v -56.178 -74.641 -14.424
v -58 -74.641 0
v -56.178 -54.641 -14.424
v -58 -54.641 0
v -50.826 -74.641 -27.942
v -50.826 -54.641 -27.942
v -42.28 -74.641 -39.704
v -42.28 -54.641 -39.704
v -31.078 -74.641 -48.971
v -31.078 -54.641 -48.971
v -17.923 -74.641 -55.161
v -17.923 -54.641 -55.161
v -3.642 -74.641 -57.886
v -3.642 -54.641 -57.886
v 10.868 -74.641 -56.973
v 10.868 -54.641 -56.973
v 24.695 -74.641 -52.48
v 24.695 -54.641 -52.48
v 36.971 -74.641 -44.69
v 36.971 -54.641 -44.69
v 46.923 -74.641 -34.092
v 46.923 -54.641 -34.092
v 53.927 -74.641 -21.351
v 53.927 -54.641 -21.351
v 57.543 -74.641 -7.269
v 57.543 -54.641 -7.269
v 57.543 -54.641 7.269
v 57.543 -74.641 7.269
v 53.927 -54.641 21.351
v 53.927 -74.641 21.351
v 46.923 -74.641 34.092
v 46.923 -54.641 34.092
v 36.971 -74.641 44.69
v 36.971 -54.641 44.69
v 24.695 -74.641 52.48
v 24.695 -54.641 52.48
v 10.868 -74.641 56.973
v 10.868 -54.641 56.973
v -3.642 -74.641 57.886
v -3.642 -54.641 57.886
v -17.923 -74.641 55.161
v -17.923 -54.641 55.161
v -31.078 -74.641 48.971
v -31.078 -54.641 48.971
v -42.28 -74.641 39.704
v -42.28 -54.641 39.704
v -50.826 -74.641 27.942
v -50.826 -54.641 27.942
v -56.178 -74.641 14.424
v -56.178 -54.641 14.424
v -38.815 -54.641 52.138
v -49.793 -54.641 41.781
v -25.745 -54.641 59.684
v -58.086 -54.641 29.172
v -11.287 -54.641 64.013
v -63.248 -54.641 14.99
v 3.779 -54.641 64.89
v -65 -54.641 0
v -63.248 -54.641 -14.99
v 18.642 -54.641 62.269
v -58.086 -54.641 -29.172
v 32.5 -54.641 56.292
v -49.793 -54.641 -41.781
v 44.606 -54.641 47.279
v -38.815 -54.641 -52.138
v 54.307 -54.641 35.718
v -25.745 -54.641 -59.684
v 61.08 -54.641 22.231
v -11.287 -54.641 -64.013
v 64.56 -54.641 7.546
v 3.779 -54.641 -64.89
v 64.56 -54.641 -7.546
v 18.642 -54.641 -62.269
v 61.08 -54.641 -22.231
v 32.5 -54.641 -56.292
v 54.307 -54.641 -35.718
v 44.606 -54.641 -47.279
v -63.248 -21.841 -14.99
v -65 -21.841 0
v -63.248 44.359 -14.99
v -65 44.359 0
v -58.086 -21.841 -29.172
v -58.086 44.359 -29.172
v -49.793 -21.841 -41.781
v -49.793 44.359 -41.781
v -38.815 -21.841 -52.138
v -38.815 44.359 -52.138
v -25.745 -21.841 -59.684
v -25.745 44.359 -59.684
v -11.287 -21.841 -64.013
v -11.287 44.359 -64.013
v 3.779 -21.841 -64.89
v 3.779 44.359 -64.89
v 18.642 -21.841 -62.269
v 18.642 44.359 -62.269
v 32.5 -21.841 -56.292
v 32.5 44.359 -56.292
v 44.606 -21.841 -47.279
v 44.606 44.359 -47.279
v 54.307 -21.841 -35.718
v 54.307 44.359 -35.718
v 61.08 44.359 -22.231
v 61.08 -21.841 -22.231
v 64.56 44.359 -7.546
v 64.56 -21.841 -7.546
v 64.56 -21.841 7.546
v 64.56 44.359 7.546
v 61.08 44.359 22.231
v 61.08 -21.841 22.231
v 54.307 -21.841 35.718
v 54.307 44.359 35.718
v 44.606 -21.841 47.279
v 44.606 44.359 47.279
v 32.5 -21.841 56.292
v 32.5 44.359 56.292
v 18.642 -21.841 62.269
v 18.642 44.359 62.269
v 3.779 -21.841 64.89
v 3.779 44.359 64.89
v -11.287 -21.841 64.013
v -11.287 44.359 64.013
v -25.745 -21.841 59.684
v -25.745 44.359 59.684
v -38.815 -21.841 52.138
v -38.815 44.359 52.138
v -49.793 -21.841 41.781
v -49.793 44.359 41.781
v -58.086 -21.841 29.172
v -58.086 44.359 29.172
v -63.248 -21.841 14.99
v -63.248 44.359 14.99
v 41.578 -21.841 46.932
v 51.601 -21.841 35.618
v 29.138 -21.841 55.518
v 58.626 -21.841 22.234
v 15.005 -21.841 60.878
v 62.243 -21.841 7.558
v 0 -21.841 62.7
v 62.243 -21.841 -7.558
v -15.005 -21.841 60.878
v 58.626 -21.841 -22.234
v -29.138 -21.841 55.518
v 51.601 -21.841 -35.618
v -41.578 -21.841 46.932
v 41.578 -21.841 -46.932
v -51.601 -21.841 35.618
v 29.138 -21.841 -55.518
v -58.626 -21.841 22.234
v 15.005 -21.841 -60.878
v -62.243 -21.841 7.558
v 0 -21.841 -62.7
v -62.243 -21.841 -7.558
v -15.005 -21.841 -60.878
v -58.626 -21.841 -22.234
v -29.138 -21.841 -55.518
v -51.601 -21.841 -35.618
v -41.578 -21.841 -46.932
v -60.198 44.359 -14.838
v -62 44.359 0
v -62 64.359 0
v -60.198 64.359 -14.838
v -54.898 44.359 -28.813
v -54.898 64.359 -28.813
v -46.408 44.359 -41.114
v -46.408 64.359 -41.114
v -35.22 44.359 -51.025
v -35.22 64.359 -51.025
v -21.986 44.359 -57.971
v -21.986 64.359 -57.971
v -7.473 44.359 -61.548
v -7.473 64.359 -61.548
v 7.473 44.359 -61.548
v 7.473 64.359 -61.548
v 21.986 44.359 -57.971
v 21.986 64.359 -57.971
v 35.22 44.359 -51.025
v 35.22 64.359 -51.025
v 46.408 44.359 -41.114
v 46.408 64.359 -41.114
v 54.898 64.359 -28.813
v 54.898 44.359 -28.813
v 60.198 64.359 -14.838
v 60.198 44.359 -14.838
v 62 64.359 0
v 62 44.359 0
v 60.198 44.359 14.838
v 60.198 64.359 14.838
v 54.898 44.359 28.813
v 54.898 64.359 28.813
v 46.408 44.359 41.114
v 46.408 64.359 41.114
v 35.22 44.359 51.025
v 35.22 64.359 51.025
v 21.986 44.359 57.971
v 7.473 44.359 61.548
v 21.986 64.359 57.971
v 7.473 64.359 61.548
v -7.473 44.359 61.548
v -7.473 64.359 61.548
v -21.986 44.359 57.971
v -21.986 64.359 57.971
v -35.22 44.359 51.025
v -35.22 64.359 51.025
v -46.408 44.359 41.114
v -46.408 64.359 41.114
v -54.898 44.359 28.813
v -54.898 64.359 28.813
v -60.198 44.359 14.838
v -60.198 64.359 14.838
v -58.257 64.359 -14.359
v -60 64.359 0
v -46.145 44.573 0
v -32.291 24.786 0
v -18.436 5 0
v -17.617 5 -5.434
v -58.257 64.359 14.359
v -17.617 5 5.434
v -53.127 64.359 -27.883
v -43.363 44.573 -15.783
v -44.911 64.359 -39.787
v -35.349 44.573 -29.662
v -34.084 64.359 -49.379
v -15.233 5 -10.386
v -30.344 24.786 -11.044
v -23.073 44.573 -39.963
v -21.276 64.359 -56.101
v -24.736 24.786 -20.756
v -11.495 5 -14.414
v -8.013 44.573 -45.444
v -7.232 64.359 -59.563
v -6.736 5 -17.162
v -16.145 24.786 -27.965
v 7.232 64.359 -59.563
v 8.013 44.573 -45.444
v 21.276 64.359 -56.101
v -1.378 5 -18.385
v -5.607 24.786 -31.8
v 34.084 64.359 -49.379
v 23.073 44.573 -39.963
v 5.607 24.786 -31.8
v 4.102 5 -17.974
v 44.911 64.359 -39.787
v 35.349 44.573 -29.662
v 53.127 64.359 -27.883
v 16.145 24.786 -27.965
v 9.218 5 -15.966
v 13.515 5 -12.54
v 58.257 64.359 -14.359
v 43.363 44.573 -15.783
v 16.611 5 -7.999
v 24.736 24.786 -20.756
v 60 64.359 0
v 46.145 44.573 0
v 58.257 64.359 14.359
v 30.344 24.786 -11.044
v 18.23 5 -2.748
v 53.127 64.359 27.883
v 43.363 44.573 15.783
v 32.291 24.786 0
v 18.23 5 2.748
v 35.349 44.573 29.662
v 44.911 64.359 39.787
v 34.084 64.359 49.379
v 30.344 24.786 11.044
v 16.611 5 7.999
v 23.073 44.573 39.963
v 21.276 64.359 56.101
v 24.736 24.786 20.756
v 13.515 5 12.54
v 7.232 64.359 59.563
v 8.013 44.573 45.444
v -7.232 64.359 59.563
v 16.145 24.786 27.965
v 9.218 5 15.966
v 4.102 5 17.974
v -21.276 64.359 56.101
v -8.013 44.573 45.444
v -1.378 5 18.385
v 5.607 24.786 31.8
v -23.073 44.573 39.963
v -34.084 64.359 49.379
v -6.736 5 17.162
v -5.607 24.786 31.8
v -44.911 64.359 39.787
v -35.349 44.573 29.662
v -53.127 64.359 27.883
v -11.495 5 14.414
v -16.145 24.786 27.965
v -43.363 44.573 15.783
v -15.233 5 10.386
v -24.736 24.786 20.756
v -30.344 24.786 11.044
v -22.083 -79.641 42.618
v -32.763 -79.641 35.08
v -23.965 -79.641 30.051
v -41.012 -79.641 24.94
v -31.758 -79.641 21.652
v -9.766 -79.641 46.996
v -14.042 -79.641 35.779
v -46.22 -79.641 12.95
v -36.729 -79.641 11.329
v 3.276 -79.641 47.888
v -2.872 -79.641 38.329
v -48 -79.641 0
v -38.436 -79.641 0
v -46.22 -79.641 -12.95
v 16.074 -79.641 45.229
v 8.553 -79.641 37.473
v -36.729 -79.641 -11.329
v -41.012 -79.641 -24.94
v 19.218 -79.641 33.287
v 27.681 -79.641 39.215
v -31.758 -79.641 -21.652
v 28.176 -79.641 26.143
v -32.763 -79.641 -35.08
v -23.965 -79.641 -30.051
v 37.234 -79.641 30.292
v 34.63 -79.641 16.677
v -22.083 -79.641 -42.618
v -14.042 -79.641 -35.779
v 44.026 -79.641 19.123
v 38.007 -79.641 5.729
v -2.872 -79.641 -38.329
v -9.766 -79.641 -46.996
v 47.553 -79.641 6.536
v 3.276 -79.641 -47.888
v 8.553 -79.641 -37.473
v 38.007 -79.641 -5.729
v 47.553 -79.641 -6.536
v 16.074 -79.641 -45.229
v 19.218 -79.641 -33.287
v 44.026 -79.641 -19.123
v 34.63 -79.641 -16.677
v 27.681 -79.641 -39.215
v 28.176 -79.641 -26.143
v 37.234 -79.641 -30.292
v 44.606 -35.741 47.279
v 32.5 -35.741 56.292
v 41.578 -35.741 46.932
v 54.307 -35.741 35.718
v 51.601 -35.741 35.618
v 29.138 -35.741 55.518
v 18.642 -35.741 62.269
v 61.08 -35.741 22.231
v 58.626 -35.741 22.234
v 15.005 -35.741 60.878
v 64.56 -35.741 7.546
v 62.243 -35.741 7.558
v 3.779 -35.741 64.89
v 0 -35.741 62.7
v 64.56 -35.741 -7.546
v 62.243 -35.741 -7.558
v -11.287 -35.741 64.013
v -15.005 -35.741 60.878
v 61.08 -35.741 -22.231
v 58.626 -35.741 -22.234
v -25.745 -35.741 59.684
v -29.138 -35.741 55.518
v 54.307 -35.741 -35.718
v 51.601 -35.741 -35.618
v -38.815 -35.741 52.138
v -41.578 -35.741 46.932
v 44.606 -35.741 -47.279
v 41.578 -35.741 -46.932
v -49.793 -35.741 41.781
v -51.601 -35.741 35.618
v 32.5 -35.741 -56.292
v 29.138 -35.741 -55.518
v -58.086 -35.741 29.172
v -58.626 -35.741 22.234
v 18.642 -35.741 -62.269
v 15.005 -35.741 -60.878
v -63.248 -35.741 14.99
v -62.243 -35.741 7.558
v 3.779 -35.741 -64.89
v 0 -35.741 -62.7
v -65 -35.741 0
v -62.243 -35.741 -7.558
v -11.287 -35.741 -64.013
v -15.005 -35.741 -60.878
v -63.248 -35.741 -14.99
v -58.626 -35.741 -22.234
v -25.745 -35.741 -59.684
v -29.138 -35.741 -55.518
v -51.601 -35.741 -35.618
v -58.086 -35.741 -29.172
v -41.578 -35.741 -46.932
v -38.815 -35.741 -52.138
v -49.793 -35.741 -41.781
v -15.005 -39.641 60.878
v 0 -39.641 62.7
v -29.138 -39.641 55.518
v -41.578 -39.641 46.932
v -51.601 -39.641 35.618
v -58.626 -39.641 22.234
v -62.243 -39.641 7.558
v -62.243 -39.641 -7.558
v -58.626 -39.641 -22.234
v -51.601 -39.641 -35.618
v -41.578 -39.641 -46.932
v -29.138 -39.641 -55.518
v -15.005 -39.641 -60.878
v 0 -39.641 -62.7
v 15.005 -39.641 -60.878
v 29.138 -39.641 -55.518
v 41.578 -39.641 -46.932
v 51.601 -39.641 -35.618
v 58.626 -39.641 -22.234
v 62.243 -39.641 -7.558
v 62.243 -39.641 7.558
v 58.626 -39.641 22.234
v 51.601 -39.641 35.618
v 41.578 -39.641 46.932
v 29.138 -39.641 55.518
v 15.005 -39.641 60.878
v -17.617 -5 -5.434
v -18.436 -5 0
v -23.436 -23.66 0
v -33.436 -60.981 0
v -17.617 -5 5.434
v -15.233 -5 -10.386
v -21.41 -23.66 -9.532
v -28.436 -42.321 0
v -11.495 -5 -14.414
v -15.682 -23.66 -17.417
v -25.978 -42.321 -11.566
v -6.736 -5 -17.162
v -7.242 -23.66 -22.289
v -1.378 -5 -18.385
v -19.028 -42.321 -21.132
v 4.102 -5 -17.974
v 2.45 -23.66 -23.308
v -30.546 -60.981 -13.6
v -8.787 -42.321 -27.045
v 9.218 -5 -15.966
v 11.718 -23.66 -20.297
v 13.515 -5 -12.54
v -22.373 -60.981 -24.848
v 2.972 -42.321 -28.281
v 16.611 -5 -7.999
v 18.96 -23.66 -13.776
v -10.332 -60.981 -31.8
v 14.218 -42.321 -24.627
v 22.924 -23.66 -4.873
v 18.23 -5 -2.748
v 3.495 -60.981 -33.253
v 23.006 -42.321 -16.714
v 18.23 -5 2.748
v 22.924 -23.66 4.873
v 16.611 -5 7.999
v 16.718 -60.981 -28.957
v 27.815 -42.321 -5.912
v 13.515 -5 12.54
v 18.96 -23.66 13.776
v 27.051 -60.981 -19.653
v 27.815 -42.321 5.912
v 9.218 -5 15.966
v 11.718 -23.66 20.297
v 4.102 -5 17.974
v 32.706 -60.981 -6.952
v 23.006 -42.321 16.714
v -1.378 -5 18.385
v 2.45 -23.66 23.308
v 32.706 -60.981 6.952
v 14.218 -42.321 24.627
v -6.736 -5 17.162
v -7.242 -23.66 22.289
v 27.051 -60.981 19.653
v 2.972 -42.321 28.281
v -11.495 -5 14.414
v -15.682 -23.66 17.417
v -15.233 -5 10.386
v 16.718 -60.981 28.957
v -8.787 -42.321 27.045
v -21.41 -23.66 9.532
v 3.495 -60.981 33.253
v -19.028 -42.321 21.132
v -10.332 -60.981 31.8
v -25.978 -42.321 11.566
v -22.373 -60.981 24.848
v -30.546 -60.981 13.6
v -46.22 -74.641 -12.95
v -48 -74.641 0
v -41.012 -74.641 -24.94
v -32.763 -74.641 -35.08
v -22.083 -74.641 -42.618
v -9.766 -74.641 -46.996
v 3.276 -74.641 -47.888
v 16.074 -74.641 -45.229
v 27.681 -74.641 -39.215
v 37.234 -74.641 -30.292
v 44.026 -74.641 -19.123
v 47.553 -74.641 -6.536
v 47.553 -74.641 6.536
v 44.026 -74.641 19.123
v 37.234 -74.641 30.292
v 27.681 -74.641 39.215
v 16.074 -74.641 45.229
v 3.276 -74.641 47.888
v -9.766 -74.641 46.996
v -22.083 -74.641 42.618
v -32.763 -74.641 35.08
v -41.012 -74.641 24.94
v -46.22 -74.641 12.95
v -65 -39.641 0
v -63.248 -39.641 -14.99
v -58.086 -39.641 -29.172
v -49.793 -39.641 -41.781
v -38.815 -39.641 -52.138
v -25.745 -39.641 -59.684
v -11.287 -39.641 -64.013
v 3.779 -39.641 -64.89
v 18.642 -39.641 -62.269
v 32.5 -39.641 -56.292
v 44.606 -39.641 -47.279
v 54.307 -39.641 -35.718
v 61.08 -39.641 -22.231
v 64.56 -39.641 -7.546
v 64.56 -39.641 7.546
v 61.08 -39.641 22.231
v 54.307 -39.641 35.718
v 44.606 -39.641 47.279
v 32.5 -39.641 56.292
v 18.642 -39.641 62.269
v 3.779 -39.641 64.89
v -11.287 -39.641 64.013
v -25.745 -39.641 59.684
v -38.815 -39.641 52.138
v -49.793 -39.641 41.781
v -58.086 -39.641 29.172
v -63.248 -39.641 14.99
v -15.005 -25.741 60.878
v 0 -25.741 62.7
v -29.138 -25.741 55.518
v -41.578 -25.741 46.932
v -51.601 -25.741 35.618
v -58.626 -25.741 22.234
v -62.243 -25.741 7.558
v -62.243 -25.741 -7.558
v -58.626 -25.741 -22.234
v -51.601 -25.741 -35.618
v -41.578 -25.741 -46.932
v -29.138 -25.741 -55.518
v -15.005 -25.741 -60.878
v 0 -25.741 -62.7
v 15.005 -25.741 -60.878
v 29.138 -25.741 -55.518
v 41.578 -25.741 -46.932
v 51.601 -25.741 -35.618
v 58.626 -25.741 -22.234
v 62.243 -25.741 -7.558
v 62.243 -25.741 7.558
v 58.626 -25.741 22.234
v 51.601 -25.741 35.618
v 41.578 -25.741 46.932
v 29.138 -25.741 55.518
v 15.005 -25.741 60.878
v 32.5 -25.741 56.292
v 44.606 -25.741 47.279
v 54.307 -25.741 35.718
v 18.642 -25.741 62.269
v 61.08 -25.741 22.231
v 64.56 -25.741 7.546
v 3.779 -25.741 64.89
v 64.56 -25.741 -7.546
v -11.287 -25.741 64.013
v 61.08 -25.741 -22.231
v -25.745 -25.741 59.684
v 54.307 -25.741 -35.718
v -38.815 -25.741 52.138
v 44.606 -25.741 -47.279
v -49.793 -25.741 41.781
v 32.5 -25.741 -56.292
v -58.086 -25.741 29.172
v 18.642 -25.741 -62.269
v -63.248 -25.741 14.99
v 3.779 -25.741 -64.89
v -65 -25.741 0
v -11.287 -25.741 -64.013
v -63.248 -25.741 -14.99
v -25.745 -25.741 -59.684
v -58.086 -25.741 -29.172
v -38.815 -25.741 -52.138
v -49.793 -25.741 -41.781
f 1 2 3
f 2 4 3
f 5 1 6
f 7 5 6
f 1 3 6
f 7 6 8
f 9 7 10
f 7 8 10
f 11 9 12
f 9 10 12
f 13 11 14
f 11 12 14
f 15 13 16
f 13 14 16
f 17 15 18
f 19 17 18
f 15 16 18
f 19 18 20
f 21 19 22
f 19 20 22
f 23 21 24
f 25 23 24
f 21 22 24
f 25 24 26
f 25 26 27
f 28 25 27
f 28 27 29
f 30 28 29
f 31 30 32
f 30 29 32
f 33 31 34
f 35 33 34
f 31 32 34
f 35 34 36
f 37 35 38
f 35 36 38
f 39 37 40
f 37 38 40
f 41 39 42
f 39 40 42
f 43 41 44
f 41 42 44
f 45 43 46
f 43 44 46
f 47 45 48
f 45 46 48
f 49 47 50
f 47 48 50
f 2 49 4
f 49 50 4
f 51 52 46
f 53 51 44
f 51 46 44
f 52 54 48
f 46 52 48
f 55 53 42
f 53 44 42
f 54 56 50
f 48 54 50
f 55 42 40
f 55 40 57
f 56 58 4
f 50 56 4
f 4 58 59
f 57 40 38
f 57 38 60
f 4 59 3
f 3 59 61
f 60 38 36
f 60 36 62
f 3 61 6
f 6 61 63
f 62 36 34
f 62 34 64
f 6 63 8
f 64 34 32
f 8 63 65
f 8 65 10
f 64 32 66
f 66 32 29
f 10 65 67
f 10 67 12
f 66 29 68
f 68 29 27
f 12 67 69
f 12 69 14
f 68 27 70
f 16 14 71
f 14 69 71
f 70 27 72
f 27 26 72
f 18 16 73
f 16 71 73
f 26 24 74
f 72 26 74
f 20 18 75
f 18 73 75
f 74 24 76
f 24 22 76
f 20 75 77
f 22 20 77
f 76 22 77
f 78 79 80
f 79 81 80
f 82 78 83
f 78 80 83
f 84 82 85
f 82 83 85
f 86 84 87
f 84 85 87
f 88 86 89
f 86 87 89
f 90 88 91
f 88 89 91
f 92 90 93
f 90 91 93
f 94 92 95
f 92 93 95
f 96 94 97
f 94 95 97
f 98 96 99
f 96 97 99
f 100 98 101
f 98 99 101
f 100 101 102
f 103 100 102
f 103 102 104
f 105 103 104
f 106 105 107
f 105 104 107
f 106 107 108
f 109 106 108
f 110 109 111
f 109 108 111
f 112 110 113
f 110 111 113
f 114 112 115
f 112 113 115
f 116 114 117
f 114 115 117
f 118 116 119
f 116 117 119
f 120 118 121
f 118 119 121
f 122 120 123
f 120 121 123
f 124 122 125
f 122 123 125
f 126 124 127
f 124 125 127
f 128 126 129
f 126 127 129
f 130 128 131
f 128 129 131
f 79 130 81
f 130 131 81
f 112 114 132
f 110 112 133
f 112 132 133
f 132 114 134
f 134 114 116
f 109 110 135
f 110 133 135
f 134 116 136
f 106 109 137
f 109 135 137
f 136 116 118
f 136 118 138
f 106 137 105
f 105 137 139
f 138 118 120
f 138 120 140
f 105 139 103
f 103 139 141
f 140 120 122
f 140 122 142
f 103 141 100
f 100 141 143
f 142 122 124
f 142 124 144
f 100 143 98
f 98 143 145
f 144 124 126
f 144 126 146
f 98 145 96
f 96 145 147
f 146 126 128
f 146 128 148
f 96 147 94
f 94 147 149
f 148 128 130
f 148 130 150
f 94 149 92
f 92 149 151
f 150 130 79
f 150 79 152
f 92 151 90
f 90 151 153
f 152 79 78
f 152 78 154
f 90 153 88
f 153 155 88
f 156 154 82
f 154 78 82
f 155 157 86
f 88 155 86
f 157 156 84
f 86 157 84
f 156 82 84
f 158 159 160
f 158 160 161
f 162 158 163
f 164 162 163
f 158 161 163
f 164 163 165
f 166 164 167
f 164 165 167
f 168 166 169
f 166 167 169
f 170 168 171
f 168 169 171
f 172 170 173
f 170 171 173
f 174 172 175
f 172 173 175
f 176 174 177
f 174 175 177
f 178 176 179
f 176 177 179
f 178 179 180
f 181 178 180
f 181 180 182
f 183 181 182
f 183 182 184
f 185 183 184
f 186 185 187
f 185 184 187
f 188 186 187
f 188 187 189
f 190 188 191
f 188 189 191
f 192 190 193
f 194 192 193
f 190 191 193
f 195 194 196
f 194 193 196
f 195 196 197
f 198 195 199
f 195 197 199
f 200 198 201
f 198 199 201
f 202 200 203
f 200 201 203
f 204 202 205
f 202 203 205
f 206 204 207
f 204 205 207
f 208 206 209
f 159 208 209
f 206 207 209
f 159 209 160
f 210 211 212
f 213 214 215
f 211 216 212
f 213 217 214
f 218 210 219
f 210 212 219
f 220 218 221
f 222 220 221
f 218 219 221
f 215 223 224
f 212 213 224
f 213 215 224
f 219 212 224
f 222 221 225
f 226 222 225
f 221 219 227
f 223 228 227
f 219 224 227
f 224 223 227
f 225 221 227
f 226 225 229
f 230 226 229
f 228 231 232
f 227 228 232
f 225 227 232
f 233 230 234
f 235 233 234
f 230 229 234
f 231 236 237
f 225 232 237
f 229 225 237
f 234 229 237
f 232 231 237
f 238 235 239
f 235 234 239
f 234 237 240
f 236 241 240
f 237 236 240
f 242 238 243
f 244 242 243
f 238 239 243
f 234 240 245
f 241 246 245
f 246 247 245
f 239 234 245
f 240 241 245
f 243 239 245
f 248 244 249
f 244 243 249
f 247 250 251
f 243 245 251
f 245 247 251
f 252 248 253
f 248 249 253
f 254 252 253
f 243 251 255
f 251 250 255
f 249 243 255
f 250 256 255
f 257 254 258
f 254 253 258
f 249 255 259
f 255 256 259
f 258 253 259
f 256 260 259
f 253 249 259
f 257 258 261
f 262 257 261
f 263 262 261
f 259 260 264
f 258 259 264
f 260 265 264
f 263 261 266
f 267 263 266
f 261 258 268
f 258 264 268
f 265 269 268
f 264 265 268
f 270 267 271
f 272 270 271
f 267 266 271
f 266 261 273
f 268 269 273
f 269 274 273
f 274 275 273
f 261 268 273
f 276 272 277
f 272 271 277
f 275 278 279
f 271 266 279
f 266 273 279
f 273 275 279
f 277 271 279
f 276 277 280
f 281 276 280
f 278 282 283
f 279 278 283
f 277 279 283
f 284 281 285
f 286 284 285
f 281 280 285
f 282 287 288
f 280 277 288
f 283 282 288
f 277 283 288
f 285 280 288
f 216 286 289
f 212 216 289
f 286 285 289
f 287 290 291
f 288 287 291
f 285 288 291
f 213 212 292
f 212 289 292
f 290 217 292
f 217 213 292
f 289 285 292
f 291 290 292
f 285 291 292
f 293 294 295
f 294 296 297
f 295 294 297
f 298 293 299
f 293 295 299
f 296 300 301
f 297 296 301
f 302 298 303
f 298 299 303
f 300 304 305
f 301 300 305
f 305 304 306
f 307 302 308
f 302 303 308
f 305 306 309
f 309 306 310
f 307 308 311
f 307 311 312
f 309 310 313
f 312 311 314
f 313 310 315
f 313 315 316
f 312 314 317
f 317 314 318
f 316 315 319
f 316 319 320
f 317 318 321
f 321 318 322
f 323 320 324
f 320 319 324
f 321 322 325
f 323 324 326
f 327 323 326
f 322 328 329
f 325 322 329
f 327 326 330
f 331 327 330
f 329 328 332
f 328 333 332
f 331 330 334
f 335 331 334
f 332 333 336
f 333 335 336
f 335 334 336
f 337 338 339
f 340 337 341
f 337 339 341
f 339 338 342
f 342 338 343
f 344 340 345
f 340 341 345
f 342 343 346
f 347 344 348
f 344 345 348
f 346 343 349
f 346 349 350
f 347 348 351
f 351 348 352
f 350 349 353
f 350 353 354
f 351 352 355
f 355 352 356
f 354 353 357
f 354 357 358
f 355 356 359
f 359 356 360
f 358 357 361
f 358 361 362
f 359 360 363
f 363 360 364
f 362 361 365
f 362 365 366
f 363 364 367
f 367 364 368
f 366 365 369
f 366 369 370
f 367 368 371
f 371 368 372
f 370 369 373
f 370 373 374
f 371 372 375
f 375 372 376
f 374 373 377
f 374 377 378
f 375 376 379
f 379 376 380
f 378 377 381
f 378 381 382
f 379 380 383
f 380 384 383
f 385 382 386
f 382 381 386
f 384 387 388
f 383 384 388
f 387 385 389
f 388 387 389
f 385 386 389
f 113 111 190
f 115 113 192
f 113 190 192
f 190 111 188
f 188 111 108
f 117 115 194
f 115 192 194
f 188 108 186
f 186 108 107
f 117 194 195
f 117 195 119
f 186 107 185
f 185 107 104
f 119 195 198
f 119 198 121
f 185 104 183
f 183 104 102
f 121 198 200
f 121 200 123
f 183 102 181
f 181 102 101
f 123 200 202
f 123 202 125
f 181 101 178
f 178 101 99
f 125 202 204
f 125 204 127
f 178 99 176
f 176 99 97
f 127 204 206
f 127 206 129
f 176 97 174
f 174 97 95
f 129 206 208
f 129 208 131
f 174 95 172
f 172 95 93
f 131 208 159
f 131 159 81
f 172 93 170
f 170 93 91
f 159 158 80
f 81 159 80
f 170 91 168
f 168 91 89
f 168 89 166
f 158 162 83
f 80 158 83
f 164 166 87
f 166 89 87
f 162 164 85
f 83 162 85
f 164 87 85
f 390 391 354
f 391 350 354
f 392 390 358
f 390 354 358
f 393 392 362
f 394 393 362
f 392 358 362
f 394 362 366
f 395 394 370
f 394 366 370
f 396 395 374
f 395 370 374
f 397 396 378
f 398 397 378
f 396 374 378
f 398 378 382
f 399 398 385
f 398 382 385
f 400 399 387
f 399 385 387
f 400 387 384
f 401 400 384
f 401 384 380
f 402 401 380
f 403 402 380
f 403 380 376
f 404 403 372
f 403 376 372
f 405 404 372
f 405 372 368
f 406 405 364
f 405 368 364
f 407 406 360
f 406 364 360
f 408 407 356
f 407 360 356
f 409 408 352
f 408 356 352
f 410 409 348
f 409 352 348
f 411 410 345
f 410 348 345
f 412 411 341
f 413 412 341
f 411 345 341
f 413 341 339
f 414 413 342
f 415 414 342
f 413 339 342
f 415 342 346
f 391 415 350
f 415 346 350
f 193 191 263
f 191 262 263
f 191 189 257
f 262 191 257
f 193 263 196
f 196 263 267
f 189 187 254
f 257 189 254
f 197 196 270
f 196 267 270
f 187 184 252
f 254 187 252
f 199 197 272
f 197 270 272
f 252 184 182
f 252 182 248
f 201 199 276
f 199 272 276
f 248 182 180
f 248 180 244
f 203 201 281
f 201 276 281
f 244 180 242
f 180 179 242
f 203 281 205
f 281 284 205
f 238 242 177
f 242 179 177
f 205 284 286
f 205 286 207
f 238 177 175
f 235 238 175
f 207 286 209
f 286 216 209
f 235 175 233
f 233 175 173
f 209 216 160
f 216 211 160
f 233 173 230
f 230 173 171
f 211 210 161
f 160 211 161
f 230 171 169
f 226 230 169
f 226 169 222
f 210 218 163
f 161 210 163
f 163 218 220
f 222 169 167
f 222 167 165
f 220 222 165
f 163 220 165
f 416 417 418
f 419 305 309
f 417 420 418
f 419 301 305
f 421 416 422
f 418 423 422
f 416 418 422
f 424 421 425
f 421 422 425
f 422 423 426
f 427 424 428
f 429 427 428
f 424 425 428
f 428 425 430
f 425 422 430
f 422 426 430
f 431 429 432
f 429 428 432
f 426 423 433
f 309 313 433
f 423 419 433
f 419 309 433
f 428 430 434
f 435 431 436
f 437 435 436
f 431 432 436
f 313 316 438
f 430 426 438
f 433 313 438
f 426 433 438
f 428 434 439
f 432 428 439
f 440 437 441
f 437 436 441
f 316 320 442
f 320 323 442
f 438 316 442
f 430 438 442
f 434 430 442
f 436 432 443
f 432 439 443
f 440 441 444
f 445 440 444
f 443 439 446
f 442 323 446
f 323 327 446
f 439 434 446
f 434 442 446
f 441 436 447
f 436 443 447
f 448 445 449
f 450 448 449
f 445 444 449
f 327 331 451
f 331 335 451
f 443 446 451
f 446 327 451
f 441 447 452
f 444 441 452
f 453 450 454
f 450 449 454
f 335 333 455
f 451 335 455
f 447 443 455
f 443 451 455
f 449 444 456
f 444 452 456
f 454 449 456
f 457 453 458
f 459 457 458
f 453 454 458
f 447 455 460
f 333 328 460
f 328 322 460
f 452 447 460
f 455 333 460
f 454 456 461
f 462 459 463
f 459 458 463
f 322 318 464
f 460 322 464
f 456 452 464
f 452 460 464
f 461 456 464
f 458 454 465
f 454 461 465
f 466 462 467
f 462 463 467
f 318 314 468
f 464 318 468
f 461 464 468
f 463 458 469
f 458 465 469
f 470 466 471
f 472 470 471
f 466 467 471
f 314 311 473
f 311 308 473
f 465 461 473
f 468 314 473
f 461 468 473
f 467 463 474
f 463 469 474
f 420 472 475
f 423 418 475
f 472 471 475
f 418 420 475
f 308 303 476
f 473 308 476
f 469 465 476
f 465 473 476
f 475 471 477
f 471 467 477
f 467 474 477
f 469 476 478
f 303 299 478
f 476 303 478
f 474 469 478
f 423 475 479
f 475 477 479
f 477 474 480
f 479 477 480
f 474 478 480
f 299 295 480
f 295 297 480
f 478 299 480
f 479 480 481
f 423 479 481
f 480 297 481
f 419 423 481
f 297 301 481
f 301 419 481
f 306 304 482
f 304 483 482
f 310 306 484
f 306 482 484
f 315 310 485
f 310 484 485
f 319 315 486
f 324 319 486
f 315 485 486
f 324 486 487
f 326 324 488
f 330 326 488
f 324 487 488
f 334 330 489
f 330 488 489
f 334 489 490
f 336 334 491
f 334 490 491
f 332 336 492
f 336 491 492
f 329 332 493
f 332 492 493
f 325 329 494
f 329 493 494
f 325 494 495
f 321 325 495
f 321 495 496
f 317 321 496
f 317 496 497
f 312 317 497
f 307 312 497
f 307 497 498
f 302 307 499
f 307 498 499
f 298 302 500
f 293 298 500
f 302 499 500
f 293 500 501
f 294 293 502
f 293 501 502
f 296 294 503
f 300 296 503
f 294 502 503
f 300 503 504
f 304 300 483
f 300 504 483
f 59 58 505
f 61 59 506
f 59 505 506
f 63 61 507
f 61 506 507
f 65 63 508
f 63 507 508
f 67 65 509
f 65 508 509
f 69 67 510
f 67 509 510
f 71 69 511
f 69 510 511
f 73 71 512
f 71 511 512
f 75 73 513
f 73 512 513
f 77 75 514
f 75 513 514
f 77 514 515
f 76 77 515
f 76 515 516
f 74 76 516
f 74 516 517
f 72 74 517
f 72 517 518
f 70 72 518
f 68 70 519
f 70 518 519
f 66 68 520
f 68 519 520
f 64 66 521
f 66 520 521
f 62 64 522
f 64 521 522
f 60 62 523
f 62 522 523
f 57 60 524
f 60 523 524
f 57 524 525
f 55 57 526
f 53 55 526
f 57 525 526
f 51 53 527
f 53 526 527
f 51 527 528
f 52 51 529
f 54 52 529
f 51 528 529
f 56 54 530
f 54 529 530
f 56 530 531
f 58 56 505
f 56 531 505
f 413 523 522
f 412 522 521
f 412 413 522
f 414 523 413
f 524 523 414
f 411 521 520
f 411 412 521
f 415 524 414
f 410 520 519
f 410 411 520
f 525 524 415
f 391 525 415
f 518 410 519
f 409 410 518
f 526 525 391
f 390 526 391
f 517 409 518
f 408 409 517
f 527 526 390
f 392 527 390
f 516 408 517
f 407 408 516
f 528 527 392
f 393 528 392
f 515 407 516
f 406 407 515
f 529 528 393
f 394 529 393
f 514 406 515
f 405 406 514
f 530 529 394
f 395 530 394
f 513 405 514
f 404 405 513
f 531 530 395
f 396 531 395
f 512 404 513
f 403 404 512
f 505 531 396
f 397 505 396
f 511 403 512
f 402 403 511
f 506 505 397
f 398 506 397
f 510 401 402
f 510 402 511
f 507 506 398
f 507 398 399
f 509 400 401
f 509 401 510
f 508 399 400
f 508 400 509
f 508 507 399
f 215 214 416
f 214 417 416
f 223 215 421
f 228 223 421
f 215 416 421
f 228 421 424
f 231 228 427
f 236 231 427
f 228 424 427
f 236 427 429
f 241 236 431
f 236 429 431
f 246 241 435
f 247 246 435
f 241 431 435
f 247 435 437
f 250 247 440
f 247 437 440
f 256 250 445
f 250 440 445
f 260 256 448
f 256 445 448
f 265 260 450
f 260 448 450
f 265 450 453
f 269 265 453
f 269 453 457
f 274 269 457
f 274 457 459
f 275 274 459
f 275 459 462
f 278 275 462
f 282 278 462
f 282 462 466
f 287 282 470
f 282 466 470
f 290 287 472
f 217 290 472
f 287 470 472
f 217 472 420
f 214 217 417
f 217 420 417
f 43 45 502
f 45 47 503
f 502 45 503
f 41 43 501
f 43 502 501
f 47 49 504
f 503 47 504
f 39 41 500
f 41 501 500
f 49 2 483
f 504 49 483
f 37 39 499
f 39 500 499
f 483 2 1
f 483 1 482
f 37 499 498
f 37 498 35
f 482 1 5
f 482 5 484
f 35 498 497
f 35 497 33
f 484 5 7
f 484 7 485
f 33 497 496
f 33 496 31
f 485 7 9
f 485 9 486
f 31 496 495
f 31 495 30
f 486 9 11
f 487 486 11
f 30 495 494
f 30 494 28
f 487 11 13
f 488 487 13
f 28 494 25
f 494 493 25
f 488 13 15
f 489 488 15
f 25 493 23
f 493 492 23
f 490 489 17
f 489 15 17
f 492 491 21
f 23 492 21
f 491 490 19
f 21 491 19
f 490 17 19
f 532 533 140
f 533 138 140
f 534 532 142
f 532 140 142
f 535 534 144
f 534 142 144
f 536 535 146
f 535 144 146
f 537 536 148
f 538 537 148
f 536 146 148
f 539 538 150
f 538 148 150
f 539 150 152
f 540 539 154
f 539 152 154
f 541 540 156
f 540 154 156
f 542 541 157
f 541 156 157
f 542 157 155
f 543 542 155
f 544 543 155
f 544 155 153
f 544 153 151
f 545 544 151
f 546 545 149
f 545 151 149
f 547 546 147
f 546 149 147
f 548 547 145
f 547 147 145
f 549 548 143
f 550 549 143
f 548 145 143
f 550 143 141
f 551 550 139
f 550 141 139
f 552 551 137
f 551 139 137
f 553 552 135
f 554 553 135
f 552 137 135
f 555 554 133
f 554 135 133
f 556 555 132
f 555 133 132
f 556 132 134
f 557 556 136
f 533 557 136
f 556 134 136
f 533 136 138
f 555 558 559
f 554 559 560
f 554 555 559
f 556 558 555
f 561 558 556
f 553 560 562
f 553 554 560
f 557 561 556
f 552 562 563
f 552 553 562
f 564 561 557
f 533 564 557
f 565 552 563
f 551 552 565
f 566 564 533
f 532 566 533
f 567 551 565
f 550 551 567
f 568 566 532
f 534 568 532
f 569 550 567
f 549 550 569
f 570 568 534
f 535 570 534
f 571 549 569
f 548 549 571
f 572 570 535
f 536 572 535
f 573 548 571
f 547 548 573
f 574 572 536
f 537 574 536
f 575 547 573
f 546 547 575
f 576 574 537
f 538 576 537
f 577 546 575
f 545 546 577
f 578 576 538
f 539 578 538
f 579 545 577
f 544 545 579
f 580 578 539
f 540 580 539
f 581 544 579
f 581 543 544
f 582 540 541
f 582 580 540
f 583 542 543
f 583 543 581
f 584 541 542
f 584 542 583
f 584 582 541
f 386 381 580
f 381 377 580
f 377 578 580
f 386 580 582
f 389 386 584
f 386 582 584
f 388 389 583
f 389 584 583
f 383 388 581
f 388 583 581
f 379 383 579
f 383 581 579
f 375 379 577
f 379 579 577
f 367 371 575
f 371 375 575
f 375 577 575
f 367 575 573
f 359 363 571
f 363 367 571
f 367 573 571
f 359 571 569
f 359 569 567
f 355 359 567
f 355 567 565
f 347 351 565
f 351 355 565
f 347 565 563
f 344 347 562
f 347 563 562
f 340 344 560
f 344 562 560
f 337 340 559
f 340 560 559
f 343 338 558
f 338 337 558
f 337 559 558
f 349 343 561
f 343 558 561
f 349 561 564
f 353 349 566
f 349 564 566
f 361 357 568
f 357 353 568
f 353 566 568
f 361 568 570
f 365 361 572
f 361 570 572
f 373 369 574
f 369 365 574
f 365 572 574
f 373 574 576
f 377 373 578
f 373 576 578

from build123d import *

# Parameters (mm, degrees)
SZKIC2_W = 2.3
SZKIC2_H = 3.9


with BuildPart() as part:
    # Szkic1 → Obrót1 (revolve)
    with BuildSketch(Plane.XY, mode=Mode.PRIVATE) as obr_t1_sk:
        Polygon((60, 64.358983849), (18.436392049, 5), (18.436392049, -5), (38.436392049, -79.641016151), (48, -79.641016151), (48, -74.641016151), (58, -74.641016151), (58, -54.641016151), (65, -54.641016151), (65, 44.358983849), (62, 44.358983849), (62, 64.358983849), align=None)
    revolve(obr_t1_sk.sketch.rotate(Axis((0, 60.824555965, 0), (0, -1, 0)), 180), axis=Axis((0, 60.824555965, 0), (0, -1, 0)))

    # Szkic2 → Wycięcie-obrót1 (revolve, cut)
    with BuildSketch(Plane.XY, mode=Mode.PRIVATE) as wyci_cie_obr_t1_sk:
        with Locations((63.85, -37.691016151)):
            Rectangle(SZKIC2_W, SZKIC2_H)
        with Locations((63.85, -23.791016151)):
            Rectangle(SZKIC2_W, SZKIC2_H)
    revolve(wyci_cie_obr_t1_sk.sketch.rotate(Axis((0, 85.874550226, 0), (0, -1, 0)), 90), axis=Axis((0, 85.874550226, 0), (0, -1, 0)), mode=Mode.SUBTRACT)


solid = part.part
